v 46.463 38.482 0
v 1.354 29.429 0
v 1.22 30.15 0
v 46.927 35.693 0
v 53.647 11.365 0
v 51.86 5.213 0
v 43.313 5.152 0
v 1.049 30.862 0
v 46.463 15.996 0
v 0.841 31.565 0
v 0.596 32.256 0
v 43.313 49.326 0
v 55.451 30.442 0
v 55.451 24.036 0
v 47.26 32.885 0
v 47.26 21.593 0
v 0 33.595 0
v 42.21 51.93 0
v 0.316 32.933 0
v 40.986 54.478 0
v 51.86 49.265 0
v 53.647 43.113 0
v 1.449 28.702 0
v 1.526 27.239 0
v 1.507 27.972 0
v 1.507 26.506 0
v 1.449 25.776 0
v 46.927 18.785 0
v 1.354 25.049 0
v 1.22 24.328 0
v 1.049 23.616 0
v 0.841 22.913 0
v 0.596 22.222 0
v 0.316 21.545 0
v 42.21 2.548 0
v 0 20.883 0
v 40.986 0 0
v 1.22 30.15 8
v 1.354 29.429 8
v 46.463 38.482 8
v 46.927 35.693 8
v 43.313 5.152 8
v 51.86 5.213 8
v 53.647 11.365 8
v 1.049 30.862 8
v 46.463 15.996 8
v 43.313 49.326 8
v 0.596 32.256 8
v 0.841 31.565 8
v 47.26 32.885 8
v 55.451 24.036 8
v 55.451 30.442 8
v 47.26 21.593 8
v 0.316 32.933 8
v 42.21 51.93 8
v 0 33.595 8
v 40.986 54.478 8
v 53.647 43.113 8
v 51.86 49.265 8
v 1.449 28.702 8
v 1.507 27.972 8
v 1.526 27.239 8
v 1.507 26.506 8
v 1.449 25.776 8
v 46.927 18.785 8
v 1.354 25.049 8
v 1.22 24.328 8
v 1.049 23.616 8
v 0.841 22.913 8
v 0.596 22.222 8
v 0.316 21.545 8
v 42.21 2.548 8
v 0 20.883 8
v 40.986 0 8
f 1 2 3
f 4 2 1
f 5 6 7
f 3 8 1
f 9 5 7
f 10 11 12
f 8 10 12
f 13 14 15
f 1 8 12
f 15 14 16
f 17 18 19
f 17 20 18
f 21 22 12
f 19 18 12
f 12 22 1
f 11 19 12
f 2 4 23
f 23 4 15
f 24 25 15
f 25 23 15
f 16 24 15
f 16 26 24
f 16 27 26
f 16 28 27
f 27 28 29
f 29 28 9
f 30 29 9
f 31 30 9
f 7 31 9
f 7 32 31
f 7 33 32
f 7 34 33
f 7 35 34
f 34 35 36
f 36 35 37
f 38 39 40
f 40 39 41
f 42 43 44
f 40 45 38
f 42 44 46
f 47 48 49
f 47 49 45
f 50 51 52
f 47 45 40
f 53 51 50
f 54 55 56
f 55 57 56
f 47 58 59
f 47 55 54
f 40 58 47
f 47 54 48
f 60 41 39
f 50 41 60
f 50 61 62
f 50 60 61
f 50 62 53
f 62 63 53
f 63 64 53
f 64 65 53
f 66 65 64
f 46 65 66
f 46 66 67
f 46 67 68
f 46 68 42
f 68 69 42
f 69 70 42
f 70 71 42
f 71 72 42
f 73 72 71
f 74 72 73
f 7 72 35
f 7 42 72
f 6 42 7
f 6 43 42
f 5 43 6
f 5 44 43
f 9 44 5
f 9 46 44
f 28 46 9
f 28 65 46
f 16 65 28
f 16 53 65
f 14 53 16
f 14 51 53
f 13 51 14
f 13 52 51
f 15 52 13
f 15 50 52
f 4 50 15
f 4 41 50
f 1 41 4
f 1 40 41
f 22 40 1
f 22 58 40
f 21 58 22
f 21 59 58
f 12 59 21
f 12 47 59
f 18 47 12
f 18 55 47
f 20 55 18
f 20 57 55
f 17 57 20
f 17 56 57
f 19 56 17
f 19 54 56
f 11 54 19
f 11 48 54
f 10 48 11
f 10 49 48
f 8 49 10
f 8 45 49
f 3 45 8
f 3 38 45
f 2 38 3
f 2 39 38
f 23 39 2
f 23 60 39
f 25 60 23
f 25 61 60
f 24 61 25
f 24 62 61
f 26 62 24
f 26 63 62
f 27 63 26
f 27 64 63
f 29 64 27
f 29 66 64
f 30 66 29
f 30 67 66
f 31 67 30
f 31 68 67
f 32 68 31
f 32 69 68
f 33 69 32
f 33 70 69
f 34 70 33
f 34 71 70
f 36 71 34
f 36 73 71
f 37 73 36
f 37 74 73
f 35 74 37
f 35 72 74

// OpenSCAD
$fn = 32;

// ----------------------------------------------------------------------
// Gear sector: 3 teeth on 54 degrees
// ----------------------------------------------------------------------

// --- parameters (mm) ---
sector_angle = 54;        // sector angle, degrees
root_r = 60;              // root circle radius
tooth_h = 8;              // tooth height over the root circle
teeth = 3;                // number of teeth on the sector
hub_r = 14;               // hub bore radius
plate_t = 8;              // sector thickness, Z
arc_step = 3;             // sampling step of the root/hub arcs, degrees
fit_tol = 0.1;            // declared fit tolerance (prompt contract)
free_tol = 0.5;           // declared free tolerance (prompt contract)

tip_r = root_r + tooth_h;  // tip circle radius

profile = [[40.986, 0], [42.21, 2.548], [43.313, 5.152], [51.86, 5.213], [53.647, 11.365], [46.463, 15.996], [46.927, 18.785], [47.26, 21.593], [55.451, 24.036], [55.451, 30.442], [47.26, 32.885], [46.927, 35.693], [46.463, 38.482], [53.647, 43.113], [51.86, 49.265], [43.313, 49.326], [42.21, 51.93], [40.986, 54.478], [0, 33.595], [0.316, 32.933], [0.596, 32.256], [0.841, 31.565], [1.049, 30.862], [1.22, 30.15], [1.354, 29.429], [1.449, 28.702], [1.507, 27.972], [1.526, 27.239], [1.507, 26.506], [1.449, 25.776], [1.354, 25.049], [1.22, 24.328], [1.049, 23.616], [0.841, 22.913], [0.596, 22.222], [0.316, 21.545], [0, 20.883]];  // primary outline, 37 points, counter clockwise

// --- the one profile operation ---
linear_extrude(height = plate_t) polygon(points = profile);
